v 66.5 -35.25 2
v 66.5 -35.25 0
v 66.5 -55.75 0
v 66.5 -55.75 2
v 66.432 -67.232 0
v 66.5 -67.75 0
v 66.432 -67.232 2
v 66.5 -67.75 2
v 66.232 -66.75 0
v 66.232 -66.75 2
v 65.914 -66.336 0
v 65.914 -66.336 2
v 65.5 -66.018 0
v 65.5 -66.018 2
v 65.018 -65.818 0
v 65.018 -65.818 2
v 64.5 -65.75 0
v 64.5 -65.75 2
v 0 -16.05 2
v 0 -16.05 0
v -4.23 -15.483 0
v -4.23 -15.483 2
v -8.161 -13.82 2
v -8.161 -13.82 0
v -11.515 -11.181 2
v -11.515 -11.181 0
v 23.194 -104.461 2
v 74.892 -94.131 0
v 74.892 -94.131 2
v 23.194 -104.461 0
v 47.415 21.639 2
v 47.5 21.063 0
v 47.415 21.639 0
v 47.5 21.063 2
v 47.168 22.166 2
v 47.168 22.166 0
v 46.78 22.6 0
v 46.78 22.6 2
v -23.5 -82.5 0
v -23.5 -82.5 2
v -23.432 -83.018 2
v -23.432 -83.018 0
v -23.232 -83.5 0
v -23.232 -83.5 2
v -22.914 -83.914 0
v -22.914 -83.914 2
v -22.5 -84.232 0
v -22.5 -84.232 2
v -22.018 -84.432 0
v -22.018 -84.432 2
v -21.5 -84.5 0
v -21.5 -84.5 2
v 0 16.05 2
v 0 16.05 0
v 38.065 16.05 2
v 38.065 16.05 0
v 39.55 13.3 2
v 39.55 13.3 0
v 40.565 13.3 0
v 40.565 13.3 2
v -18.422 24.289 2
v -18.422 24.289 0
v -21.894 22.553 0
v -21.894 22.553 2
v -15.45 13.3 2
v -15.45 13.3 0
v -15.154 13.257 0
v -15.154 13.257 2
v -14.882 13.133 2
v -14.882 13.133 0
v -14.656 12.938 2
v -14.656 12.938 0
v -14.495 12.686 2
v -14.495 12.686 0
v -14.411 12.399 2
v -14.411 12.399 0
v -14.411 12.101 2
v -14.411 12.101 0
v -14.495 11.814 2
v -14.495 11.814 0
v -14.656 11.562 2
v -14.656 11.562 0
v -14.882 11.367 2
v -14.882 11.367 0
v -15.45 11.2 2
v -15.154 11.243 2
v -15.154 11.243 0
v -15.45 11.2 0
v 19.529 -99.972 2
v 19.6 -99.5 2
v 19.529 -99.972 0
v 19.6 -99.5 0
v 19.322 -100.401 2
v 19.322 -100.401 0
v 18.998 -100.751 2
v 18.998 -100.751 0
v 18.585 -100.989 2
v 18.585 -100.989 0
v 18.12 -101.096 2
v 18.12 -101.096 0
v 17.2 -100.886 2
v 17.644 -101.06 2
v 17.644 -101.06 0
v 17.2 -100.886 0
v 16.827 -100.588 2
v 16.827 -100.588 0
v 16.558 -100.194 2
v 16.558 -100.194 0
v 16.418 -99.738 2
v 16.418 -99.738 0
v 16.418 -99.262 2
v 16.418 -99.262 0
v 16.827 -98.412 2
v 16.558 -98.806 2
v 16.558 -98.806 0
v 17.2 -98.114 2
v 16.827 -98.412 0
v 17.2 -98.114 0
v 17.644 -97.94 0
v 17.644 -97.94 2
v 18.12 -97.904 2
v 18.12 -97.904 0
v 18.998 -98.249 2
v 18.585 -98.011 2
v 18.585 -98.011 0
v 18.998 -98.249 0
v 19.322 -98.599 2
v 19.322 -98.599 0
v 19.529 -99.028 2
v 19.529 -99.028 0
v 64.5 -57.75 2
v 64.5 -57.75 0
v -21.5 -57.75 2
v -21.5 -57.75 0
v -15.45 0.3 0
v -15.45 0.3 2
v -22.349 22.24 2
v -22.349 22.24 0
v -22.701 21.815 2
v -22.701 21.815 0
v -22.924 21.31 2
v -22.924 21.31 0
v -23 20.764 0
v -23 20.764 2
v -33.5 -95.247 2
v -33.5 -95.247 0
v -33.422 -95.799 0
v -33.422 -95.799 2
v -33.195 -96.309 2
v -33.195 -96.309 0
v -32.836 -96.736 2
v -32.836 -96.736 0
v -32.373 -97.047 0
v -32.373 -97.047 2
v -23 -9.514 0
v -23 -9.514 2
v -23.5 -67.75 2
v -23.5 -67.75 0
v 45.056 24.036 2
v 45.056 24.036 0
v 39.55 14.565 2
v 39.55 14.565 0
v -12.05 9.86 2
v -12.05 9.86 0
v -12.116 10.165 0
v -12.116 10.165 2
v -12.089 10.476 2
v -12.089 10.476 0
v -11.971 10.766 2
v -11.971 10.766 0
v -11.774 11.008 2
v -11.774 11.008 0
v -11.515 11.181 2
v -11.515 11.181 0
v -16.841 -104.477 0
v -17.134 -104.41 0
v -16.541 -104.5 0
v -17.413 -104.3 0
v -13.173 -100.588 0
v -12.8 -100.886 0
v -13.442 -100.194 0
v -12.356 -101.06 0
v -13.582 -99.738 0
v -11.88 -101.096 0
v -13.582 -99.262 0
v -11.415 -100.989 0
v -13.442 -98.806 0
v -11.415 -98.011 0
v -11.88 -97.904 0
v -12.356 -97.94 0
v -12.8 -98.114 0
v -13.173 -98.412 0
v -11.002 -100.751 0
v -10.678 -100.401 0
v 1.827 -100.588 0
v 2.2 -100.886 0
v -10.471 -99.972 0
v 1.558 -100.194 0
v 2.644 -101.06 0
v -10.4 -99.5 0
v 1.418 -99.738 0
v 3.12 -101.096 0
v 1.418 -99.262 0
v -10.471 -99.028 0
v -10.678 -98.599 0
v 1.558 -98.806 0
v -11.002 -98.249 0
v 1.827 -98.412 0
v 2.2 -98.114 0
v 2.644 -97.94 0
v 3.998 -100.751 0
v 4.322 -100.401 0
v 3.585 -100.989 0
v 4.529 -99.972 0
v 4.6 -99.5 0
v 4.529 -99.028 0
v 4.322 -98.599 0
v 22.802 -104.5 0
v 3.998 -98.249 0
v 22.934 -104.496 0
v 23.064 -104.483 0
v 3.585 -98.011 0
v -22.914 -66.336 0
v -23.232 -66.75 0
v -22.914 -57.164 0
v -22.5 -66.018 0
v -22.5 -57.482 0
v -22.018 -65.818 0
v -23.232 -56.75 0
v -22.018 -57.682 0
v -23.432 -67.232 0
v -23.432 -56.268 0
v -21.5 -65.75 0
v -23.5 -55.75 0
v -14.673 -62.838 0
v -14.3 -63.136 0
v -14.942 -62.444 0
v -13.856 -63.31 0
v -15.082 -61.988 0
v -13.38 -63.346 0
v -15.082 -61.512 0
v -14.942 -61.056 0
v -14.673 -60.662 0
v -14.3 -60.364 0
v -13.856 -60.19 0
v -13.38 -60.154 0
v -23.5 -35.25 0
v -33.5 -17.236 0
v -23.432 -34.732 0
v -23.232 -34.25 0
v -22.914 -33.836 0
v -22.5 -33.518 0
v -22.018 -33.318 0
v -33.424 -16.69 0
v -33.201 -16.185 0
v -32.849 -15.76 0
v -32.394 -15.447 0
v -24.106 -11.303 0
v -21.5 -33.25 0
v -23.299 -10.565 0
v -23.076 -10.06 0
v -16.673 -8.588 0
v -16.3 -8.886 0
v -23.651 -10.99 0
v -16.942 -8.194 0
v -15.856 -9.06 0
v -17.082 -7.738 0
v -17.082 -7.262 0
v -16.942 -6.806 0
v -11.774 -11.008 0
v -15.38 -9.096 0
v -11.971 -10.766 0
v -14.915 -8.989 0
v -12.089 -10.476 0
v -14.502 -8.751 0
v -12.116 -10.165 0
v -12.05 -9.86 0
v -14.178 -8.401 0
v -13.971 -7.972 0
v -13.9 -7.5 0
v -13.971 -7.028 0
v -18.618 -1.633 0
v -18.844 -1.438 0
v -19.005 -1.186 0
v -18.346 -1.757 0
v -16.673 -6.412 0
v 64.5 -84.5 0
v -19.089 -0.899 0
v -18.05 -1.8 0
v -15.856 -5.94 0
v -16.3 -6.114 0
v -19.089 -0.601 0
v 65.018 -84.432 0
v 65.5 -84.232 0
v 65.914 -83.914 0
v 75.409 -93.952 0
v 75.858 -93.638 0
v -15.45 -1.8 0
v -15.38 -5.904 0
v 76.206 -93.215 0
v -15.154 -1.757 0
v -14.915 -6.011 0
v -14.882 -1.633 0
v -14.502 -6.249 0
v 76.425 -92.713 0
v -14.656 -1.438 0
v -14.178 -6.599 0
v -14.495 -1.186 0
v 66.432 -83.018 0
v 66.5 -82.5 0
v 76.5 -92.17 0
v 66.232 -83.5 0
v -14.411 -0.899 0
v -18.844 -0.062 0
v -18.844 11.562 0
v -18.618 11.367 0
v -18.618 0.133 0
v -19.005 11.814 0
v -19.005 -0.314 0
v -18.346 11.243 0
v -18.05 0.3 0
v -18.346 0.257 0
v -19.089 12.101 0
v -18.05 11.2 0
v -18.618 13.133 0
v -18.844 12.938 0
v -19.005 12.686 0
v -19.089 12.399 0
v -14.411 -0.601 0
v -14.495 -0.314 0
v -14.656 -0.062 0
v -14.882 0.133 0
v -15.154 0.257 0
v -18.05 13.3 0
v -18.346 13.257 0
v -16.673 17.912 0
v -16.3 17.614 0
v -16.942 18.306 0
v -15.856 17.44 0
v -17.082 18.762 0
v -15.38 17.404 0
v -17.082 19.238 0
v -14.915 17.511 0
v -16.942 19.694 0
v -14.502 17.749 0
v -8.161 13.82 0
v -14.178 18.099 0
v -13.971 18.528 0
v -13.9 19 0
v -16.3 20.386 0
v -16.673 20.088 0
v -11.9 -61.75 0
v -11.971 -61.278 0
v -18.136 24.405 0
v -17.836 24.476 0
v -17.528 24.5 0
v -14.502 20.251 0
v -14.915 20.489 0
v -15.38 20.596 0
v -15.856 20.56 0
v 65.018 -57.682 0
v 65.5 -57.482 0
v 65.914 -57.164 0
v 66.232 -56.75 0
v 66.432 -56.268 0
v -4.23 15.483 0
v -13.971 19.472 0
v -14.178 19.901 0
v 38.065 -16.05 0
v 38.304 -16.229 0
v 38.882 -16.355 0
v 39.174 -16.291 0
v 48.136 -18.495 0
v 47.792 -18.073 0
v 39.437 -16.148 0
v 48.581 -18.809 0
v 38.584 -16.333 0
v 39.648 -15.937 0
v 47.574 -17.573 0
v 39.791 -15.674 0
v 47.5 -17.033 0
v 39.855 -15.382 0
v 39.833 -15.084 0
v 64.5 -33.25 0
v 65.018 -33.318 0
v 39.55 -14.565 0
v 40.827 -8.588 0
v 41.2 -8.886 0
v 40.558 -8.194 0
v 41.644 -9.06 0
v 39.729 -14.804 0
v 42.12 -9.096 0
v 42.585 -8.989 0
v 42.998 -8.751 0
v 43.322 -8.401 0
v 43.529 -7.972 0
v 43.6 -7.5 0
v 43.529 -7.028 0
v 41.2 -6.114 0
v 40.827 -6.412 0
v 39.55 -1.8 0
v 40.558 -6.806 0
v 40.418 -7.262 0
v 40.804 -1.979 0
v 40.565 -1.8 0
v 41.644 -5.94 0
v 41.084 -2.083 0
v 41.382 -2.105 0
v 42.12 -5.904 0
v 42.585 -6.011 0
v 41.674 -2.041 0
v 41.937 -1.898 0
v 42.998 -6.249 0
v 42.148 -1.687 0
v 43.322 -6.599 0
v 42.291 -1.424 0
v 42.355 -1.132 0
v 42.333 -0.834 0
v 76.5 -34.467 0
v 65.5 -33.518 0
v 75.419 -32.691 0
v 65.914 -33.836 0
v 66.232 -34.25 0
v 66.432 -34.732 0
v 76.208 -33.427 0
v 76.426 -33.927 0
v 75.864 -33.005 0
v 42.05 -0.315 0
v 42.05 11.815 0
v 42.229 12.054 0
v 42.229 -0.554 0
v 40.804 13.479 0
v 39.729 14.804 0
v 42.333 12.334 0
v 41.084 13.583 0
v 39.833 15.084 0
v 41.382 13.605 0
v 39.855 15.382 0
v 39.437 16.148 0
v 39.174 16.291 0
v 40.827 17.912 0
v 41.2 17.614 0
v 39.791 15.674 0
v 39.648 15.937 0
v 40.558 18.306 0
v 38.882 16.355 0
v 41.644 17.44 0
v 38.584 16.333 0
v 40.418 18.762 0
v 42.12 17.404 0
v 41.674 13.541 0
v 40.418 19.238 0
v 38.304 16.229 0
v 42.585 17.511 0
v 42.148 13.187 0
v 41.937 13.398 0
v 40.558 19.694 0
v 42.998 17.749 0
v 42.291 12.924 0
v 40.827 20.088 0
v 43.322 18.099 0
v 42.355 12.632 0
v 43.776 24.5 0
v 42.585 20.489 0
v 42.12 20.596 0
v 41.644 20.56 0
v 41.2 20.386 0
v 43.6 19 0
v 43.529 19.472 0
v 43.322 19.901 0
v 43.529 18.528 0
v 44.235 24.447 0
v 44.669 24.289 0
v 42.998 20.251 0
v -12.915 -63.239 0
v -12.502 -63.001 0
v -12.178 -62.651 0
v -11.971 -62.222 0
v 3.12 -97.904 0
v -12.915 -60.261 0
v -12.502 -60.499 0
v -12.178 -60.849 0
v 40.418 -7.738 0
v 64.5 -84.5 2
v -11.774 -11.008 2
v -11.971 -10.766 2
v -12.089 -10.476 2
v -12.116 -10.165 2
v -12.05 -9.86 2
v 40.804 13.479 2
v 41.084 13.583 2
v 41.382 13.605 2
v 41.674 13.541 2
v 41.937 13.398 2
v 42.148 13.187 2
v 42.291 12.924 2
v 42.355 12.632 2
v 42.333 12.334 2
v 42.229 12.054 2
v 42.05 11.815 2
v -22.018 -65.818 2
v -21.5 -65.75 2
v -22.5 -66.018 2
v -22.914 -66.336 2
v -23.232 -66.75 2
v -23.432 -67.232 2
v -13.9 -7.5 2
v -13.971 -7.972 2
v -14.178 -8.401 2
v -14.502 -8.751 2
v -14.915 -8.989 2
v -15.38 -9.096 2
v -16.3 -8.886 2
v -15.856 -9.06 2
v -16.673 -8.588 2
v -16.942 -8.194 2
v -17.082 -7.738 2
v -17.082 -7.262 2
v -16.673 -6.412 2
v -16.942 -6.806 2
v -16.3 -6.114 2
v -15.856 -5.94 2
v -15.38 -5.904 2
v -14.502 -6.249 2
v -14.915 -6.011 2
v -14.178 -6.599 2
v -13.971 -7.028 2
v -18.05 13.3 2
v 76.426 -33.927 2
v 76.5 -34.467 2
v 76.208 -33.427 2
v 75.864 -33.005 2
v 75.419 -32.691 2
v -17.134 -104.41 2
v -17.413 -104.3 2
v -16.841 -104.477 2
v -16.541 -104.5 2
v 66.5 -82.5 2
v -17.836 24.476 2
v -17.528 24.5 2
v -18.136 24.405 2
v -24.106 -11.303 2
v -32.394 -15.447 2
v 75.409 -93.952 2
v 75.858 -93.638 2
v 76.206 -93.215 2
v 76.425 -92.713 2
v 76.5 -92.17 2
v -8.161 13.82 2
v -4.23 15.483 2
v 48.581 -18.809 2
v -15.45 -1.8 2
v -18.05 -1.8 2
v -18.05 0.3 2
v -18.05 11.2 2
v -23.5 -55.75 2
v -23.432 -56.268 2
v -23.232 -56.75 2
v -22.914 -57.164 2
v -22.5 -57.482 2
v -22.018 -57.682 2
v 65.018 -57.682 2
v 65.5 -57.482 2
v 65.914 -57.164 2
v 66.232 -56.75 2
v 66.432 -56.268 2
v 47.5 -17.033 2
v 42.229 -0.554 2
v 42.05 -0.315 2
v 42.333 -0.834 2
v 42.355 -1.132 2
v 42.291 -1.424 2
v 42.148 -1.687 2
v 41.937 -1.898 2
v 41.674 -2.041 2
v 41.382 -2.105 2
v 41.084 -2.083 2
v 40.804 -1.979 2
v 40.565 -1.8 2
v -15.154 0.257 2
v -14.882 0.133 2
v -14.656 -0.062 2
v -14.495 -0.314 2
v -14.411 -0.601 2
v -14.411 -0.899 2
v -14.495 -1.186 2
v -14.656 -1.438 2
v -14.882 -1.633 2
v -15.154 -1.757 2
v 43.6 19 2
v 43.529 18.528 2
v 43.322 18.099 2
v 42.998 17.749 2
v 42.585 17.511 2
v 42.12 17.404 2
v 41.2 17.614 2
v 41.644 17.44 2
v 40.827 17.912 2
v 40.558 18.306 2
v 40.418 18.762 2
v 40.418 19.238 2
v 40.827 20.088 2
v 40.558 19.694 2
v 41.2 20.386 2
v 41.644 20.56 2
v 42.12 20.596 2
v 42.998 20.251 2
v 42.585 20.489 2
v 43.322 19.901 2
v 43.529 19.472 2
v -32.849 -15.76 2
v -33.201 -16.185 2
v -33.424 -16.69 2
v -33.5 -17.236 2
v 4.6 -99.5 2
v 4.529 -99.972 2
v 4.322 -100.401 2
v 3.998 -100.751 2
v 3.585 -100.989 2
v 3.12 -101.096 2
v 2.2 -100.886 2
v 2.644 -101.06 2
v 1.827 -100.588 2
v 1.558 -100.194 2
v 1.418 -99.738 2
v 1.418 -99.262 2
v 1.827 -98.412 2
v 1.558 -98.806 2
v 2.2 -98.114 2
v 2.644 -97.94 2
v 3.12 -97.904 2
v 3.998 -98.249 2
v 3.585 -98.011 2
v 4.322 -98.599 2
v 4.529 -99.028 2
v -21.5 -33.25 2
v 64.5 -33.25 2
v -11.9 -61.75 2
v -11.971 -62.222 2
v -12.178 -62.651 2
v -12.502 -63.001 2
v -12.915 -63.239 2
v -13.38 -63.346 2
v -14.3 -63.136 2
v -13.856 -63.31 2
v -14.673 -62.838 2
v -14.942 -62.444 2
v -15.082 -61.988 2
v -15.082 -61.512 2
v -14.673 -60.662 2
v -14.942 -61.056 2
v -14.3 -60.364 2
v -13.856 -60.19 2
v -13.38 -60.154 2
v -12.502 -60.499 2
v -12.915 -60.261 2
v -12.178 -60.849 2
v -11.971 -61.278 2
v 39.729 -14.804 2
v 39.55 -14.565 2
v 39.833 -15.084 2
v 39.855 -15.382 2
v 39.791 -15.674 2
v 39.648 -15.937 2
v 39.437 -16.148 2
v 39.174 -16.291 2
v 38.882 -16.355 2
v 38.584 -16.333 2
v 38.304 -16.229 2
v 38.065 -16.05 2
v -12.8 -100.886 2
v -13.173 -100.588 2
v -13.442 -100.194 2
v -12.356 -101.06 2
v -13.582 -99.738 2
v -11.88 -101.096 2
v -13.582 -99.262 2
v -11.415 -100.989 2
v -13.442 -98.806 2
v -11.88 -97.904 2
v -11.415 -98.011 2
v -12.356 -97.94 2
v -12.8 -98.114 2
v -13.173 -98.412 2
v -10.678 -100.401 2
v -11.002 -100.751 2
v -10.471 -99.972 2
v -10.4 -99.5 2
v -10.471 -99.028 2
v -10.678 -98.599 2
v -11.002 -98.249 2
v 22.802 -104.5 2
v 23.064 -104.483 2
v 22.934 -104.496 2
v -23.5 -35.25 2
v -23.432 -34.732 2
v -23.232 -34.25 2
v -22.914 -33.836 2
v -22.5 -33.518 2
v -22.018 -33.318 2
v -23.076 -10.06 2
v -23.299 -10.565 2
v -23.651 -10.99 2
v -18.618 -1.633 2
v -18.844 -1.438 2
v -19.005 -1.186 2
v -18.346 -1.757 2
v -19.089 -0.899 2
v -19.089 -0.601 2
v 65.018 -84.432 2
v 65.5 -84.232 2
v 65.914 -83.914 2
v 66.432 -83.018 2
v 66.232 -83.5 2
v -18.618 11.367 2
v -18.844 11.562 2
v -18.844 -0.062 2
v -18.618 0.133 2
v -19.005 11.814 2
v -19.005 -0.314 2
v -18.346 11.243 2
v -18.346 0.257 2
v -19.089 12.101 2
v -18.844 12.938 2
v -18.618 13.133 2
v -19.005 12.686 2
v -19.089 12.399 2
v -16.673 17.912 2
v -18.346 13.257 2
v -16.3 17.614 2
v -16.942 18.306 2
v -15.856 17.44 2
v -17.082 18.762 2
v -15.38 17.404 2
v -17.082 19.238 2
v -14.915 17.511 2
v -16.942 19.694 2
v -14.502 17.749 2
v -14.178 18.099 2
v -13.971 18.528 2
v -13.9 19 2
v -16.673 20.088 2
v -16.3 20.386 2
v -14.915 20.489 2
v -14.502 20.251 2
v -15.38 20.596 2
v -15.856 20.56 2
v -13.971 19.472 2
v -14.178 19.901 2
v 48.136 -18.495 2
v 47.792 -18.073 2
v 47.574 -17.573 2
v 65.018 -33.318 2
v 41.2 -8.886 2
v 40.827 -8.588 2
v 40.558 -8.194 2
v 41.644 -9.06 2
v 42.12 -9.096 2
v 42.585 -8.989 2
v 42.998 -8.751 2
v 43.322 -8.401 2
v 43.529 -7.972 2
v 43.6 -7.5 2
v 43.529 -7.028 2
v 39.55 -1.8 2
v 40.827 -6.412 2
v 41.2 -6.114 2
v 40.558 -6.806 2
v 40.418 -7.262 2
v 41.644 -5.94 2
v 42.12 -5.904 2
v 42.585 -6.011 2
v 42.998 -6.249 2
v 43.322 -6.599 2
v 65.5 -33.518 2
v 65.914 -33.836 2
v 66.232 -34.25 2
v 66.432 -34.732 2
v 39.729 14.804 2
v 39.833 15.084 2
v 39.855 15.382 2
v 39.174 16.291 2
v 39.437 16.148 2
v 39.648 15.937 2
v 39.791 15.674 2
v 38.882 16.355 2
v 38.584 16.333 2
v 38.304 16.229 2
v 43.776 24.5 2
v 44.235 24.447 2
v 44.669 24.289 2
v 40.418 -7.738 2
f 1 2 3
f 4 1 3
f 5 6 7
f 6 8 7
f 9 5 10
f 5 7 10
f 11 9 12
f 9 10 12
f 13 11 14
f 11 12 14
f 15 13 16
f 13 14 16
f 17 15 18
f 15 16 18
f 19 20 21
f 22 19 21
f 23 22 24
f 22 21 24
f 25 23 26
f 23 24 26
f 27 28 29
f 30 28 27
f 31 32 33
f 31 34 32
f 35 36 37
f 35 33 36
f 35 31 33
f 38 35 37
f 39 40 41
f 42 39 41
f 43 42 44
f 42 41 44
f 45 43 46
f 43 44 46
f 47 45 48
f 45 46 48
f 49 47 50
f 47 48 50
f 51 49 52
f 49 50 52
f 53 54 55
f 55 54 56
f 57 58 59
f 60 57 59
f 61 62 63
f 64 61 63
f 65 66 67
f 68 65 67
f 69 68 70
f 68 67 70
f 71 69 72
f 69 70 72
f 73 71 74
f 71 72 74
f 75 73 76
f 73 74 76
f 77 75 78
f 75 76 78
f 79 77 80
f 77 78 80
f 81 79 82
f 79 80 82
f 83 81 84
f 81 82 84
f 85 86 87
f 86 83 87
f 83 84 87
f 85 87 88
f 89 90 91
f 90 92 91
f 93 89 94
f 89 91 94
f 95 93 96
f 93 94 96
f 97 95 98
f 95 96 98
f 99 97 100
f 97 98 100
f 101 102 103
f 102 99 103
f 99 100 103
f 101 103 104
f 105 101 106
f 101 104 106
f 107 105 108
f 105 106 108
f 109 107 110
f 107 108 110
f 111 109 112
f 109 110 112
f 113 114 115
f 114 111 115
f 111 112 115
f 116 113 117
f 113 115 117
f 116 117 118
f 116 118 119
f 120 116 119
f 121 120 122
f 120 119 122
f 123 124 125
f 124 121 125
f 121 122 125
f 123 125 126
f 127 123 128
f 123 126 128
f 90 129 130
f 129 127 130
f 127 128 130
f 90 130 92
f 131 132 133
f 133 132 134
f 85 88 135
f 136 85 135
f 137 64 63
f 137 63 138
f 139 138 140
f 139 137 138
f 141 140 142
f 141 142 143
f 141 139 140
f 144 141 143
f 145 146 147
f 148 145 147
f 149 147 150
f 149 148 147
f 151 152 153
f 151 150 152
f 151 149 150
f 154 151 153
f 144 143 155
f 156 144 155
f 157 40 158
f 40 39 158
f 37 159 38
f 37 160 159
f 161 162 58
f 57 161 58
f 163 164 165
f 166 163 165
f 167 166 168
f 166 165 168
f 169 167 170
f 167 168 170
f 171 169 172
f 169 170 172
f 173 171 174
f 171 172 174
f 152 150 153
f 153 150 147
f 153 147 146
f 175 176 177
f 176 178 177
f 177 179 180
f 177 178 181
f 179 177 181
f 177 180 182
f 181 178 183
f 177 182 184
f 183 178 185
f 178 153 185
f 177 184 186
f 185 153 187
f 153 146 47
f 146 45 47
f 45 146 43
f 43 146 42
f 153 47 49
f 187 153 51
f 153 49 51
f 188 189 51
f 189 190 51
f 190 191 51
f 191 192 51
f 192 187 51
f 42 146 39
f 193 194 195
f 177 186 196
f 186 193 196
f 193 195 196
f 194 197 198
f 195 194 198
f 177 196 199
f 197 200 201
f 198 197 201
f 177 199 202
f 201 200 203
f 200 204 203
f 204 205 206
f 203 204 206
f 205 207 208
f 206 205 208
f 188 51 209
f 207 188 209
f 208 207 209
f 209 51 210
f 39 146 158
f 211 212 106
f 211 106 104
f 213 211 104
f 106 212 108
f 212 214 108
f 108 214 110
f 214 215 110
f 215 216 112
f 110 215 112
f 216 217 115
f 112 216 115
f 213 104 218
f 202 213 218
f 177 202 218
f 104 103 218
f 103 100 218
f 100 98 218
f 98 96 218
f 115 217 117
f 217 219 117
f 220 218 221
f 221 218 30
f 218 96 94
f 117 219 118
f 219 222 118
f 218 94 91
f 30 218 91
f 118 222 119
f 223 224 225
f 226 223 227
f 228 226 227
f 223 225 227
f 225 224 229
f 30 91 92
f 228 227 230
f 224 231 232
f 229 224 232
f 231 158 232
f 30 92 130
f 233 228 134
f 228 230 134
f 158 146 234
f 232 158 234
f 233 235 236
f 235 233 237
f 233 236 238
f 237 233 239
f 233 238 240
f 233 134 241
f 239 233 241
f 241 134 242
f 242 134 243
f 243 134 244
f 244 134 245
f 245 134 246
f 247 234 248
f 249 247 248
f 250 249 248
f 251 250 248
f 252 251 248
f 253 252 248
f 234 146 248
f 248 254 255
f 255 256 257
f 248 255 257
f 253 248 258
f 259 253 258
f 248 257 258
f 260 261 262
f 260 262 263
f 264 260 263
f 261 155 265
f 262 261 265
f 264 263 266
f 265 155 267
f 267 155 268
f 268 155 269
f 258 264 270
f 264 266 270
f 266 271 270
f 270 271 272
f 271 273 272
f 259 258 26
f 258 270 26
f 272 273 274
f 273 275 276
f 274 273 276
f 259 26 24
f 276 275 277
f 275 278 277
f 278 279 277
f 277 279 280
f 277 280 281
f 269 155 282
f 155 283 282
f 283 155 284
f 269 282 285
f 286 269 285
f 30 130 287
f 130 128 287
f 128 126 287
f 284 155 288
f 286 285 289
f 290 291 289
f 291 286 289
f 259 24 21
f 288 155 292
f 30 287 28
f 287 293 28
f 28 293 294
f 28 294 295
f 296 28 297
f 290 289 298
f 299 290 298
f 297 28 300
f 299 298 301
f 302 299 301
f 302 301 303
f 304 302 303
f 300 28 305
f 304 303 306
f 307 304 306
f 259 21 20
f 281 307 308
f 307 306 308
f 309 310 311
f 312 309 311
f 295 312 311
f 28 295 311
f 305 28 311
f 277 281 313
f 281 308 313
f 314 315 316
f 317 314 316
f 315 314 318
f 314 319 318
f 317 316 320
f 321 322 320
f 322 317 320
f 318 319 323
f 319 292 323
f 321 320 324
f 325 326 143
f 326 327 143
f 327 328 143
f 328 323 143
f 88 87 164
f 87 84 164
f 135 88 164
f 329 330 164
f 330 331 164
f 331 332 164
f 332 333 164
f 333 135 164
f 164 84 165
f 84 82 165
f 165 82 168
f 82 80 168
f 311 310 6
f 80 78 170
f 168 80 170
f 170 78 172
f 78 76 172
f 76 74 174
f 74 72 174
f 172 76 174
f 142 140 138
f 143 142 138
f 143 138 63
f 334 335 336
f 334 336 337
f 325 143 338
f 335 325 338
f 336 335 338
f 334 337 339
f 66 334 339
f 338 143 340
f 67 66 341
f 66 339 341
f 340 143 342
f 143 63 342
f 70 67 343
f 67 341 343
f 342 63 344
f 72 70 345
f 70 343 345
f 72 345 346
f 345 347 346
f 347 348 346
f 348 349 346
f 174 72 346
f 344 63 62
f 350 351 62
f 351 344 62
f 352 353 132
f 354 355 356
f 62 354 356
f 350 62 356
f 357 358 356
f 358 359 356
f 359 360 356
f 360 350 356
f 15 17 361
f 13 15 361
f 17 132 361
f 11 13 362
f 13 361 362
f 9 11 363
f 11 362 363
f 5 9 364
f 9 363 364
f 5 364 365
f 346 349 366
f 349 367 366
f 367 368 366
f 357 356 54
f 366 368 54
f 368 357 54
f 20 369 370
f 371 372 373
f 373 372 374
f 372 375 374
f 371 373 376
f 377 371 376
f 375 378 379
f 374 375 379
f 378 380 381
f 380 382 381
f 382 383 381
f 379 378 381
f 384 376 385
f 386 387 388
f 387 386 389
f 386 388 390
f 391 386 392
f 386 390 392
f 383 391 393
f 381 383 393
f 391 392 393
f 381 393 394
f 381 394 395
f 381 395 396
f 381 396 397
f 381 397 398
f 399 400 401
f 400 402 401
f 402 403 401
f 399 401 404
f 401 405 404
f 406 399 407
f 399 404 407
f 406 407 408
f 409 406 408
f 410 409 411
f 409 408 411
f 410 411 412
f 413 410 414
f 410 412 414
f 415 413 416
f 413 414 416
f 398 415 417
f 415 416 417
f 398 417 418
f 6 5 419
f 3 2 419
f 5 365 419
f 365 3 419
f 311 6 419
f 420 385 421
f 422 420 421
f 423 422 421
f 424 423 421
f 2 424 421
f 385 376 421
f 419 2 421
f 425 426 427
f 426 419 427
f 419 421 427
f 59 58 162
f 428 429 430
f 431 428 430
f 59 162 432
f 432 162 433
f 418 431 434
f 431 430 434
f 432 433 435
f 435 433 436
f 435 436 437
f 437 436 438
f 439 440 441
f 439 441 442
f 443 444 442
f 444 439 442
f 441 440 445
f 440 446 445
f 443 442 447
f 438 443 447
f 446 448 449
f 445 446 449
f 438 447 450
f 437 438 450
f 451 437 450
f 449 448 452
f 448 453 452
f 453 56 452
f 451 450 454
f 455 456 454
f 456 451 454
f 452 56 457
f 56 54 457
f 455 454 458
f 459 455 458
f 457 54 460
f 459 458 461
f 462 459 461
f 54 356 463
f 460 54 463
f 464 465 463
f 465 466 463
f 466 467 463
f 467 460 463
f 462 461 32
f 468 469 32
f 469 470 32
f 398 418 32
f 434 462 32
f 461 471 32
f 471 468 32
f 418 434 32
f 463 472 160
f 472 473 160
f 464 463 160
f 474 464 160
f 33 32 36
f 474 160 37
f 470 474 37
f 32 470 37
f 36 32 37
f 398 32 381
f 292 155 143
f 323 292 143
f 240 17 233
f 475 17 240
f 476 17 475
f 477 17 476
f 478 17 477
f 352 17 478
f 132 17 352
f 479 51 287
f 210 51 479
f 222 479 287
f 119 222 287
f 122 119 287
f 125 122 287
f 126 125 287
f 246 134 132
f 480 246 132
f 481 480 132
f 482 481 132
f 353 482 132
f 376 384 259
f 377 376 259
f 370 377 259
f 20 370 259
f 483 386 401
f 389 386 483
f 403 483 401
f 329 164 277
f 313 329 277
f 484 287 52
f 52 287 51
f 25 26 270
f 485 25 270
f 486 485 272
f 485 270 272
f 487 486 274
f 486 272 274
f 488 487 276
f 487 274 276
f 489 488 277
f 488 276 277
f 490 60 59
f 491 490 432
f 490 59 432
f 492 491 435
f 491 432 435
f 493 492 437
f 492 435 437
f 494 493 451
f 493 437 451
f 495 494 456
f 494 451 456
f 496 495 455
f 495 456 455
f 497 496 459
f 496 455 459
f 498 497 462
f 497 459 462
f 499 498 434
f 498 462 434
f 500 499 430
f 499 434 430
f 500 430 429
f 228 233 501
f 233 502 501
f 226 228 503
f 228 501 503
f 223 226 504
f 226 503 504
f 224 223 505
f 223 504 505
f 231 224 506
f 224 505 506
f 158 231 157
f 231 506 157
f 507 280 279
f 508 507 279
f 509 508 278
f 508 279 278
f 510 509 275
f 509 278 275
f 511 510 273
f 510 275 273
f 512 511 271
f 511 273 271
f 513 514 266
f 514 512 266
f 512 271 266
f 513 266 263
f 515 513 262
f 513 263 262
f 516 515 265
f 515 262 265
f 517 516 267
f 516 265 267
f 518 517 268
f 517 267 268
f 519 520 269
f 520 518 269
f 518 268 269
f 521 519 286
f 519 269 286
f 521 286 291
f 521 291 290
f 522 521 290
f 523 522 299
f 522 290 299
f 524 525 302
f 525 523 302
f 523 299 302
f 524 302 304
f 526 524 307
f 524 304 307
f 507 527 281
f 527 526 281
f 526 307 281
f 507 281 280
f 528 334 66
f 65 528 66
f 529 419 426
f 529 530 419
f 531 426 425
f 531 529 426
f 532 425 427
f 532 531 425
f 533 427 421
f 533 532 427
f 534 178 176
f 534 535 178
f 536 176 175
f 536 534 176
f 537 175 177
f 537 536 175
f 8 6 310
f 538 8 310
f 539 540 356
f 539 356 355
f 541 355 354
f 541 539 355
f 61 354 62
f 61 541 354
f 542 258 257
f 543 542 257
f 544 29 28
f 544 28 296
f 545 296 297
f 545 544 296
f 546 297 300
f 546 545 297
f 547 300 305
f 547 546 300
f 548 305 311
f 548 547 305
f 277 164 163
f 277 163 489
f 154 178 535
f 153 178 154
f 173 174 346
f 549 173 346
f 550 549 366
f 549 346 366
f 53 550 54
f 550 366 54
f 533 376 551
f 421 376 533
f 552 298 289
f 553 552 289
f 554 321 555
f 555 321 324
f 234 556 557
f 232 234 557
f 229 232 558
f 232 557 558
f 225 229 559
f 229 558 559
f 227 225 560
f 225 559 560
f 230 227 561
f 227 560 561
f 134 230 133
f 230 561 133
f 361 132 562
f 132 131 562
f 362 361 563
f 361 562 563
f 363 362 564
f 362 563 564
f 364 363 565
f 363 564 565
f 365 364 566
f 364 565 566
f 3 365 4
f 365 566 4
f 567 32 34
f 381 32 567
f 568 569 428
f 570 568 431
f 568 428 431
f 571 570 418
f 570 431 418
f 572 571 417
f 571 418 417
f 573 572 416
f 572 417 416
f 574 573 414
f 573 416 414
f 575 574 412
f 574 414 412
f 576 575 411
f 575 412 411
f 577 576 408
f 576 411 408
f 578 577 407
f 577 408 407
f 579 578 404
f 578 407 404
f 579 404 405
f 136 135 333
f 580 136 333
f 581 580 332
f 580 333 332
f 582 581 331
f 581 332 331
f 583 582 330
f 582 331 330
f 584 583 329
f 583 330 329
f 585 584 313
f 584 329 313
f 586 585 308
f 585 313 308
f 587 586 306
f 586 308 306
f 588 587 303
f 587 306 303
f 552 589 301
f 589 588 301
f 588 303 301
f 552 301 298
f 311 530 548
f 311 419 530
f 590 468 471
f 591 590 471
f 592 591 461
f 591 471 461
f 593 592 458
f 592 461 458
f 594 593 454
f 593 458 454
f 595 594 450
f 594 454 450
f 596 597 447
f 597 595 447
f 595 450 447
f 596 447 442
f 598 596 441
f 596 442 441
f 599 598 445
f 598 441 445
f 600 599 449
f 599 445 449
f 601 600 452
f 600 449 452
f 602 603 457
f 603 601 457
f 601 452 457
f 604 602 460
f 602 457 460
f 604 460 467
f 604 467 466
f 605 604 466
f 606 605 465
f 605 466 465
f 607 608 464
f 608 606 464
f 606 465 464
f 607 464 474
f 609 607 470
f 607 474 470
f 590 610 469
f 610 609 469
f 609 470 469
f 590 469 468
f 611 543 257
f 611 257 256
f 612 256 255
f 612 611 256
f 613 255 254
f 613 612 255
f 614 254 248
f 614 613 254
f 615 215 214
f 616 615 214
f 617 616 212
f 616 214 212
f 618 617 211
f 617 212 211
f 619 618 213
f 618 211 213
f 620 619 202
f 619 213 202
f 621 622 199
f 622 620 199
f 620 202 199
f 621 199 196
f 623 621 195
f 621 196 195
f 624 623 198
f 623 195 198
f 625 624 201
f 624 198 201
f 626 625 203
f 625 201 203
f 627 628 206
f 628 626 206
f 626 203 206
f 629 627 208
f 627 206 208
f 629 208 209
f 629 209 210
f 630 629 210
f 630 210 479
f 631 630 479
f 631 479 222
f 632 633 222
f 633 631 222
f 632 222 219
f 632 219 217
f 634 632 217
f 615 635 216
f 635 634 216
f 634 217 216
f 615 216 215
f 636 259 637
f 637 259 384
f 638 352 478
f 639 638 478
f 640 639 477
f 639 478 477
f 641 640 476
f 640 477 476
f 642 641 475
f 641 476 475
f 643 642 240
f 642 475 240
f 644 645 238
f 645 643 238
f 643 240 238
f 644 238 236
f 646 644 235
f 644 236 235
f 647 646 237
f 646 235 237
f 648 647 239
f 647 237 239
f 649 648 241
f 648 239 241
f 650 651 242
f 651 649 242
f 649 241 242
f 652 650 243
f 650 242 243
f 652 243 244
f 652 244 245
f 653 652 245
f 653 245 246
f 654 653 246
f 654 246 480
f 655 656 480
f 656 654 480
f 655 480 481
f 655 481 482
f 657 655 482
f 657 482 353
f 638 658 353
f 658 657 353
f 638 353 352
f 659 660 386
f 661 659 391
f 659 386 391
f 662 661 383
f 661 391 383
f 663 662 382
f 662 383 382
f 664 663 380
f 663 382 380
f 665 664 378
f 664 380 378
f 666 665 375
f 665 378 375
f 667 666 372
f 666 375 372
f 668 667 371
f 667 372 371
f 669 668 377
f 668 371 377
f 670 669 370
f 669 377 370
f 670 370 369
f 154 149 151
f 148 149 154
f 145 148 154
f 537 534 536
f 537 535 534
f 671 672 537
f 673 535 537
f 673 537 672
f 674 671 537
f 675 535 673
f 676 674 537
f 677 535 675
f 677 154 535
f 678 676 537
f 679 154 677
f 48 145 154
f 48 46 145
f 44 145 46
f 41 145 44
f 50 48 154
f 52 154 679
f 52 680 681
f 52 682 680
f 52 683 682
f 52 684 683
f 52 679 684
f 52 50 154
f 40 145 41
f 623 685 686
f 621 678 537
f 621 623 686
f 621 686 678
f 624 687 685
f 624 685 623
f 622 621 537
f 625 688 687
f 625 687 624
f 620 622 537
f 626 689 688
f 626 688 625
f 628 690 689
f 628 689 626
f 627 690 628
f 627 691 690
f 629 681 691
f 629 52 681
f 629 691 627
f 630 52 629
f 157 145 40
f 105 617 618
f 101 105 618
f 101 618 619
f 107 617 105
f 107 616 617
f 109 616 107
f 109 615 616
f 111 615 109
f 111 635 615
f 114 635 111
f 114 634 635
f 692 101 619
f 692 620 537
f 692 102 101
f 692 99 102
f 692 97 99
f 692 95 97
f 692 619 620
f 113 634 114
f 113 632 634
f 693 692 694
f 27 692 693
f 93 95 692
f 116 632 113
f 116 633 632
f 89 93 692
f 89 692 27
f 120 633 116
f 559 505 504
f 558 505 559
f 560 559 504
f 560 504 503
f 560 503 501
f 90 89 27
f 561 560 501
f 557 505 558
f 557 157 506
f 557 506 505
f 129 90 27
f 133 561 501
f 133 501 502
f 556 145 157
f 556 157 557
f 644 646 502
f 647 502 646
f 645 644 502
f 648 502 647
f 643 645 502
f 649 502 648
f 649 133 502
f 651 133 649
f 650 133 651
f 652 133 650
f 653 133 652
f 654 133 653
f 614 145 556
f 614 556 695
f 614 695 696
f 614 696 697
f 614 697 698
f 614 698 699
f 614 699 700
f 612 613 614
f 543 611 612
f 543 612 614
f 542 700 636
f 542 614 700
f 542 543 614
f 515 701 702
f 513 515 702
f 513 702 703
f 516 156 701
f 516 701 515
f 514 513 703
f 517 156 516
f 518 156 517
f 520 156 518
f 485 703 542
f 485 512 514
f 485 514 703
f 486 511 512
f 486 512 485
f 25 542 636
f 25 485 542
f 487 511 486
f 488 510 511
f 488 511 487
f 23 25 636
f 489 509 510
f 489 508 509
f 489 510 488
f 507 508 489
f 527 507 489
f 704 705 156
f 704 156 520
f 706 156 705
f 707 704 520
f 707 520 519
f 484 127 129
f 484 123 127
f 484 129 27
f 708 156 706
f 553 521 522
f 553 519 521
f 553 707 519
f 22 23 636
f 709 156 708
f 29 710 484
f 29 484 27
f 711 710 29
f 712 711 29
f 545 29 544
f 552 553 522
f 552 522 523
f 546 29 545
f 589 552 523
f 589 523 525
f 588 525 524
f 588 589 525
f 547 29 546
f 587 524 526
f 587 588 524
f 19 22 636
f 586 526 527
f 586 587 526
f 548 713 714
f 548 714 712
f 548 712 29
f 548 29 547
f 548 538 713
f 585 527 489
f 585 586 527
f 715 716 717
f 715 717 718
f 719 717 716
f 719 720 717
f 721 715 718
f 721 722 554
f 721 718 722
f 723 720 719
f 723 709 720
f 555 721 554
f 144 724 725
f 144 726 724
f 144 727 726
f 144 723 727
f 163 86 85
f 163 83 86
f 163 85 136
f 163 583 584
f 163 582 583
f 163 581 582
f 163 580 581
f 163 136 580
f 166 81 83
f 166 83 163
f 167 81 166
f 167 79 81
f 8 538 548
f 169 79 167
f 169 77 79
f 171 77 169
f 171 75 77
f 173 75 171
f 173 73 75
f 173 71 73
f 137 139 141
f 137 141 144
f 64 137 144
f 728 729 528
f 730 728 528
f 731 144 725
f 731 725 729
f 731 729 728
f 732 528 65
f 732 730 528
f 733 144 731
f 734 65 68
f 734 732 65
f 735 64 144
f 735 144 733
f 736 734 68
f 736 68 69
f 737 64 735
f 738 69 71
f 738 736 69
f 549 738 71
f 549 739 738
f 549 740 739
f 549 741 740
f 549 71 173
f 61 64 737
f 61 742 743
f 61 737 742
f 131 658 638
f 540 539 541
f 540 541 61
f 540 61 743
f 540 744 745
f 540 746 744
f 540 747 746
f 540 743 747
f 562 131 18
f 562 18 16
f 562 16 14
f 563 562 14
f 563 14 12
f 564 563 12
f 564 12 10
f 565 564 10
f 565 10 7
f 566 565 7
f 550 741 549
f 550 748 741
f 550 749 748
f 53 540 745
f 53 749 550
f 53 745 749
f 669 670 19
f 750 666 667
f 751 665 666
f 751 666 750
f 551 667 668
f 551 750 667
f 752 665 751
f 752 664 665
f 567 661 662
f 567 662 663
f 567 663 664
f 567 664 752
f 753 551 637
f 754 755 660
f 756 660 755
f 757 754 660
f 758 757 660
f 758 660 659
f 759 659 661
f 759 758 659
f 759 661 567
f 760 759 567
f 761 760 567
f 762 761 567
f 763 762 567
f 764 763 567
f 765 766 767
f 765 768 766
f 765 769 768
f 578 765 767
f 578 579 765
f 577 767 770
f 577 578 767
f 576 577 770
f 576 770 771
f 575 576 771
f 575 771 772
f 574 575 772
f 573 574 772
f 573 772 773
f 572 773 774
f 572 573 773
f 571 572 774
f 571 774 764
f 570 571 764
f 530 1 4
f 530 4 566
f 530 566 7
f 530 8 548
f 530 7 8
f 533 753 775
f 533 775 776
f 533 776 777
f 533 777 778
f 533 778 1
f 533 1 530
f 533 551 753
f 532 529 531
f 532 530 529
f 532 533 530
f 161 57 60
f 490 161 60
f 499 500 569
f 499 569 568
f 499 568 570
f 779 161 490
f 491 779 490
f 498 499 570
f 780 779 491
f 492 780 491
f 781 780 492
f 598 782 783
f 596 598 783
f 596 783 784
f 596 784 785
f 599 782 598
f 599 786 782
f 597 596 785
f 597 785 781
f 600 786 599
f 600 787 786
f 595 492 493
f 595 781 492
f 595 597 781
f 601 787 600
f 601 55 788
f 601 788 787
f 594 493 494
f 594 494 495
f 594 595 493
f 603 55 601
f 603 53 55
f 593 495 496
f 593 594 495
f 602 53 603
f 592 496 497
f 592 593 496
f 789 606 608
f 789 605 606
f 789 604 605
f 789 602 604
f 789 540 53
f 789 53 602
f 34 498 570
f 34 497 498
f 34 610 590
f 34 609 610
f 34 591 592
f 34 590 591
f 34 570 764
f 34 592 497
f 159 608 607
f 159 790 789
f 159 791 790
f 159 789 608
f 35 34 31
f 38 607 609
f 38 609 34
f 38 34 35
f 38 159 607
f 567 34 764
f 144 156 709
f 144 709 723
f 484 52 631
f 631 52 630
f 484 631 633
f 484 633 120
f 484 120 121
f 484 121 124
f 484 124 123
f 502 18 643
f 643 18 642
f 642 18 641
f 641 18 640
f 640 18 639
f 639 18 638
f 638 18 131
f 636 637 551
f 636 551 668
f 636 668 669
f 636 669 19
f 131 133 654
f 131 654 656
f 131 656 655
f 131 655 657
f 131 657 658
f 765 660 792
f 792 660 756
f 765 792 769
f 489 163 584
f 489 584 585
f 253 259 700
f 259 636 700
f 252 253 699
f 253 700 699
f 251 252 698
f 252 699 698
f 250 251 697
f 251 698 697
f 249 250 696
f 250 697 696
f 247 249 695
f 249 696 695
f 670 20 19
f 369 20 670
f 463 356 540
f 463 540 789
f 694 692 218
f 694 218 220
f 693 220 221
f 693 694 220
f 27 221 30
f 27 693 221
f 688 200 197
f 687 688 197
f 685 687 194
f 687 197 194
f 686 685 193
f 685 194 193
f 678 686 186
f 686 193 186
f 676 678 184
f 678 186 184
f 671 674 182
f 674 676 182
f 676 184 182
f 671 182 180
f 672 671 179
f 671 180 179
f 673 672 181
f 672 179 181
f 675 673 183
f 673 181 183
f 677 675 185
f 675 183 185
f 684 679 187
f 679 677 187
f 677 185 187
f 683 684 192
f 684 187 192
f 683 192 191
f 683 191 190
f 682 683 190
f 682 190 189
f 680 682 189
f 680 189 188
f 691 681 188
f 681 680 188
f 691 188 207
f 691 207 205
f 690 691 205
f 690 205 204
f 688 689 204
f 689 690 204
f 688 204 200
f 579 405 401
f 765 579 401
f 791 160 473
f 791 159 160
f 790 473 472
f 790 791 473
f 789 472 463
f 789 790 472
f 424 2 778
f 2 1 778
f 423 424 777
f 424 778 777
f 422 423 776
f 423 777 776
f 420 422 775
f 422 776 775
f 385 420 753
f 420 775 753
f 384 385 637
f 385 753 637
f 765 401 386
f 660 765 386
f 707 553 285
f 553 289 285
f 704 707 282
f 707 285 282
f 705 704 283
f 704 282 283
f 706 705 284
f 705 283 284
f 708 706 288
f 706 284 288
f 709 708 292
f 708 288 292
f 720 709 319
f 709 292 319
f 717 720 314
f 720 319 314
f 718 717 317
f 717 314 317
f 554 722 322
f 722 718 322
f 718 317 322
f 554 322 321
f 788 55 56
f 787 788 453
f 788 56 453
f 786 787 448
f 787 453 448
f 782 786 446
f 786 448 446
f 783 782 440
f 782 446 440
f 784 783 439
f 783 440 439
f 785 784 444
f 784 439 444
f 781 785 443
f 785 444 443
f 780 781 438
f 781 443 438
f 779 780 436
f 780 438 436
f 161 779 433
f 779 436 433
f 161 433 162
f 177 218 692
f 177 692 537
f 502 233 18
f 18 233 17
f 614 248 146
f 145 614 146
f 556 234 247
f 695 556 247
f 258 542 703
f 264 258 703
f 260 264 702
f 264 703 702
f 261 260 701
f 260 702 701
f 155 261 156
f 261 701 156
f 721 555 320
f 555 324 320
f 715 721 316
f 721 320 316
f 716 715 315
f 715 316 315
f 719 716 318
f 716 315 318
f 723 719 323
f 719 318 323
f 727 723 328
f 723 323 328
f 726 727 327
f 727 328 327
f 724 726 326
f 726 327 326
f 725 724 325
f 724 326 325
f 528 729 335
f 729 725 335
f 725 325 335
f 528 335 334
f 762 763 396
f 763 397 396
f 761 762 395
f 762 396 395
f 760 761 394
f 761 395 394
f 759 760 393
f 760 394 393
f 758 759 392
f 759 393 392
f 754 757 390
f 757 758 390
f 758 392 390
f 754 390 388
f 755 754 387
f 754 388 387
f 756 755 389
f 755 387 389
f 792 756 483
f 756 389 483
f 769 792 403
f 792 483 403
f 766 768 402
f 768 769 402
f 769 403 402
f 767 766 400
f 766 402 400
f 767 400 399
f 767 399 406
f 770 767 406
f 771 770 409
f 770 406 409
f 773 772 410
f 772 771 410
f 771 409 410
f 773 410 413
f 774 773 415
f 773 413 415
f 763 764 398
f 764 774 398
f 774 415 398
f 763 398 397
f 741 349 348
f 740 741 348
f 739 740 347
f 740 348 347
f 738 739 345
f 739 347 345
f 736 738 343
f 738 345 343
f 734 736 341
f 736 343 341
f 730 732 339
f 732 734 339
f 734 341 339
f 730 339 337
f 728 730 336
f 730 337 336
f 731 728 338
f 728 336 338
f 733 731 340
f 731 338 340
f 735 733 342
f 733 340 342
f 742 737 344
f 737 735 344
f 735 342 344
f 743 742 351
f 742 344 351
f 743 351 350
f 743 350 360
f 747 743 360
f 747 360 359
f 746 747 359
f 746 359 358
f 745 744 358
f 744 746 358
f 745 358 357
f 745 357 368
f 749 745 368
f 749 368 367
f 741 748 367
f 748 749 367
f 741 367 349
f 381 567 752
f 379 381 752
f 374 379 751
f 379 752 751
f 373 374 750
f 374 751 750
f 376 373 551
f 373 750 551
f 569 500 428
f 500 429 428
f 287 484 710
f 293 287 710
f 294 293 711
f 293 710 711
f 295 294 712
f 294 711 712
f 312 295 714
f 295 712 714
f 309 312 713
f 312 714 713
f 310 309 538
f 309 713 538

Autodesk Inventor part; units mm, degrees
ref_plane "YZ Plane" through (0, 0, 0) normal (1, 0, 0) x (0, 1, 0)
ref_plane "XZ Plane" through (0, 0, 0) normal (0, 1, 0) x (-1, 0, 0)
ref_plane "XY Plane" through (0, 0, 0) normal (0, 0, 1) x (1, 0, 0)
sketch "スケッチ1" plane through (0, 0, 0) normal (0, 0, 1) x (1, 0, 0)
  circle A0 centre (0, 0) radius 11
  line L0 (-0.3073, 13.5) -> (26.6927, 13.5) construction
  line L1 (26.6927, 13.5) -> (26.6927, -13.5) construction
  line L2 (26.6927, -13.5) -> (-0.3073, -13.5) construction
  line L3 (-0.3073, -13.5) -> (-0.3073, 13.5) construction
  line L4 (-0.3073, 13.5) -> (26.6927, -13.5) construction
  line L5 (26.6927, 13.5) -> (-0.3073, -13.5) construction
  line L6 (-12, 16) -> (39.5, 16) construction
  line L7 (39.5, 16) -> (39.5, -16) construction
  line L8 (39.5, -16) -> (-12, -16) construction
  line L9 (-12, -16) -> (-12, 16) construction
  line L10 (-12, 16) -> (39.5, -16) construction
  line L11 (39.5, 16) -> (-12, -16) construction
  circle A1 centre (-0.3073, 13.5) radius 1.35
  arc A2 (0, 16) -> (-12, 10.583) centre (0, 0) ccw construction
  line L12 (-12, 0) -> (39.5, 0)
  circle A3 centre (26.6927, 13.5) radius 1.35
  arc A4 (-12, -10.583) -> (0, -16) centre (0, 0) ccw construction
  circle A5 centre (-0.3073, -13.5) radius 1.35
  circle A6 centre (26.6927, -13.5) radius 1.35
  arc A7 (0, 16.05) -> (-12.05, 10.6019) centre (0, 0) ccw
  line L13 (0, 16.05) -> (39.55, 16.05)
  line L14 (39.55, 16.05) -> (39.55, 13.3)
  line L15 (-12.05, 10.6019) -> (-12.05, 0)
  arc A8 (-11.5146, 11.1811) -> (-12.05, 9.86) centre (-11.0677, 10.2309) ccw
  line L16 (-12.05, 10.6019) -> (-11.0677, 10.2309) construction
  arc A9 (39.55, 14.5651) -> (38.0651, 16.05) centre (38.8075, 15.3075) ccw
  line L17 (38.8075, 15.3075) -> (39.55, 16.05) construction
  arc A10 (-12.05, -10.6019) -> (0, -16.05) centre (0, 0) ccw
  line L18 (0, -16.05) -> (39.55, -16.05)
  line L19 (-12.05, -10.6019) -> (-12.05, 0)
  arc A11 (-12.05, -9.86) -> (-11.5146, -11.1811) centre (-11.0677, -10.2309) ccw
  arc A12 (38.0651, -16.05) -> (39.55, -14.5651) centre (38.8075, -15.3075) ccw
  line L20 (39.55, 13.3) -> (42.05, 13.3)
  line L21 (42.05, 13.3) -> (42.05, -1.8)
  line L22 (42.05, -1.8) -> (39.55, -1.8)
  line L23 (39.55, -1.8) -> (39.55, -14.5651)
  line L24 (39.5, 13.25) -> (42, 13.25) construction
  line L25 (42, 13.25) -> (42, -1.75) construction
  line L26 (42, -1.75) -> (39.5, -1.75) construction
  line L27 (42, 5.75) -> (39.5, 5.75) construction
  arc A13 (42.05, 11.8151) -> (40.5651, 13.3) centre (41.3075, 12.5575) ccw
  line L28 (41.3075, 12.5575) -> (42.05, 13.3) construction
  arc A14 (40.5651, -1.8) -> (42.05, -0.3151) centre (41.3075, -1.0575) ccw
  circle A15 centre (-15.5, 19) radius 1.6
  line L29 (-18, 22) -> (-13, 22) construction
  line L30 (-13, 22) -> (-13, -10.5) construction
  line L31 (-13, -10.5) -> (-18, -10.5) construction
  line L32 (-18, -10.5) -> (-18, 22) construction
  line L33 (-18, 22) -> (-13, -10.5) construction
  line L34 (-13, 22) -> (-18, -10.5) construction
  line L35 (-18, 5.75) -> (-13, 5.75) construction
  line L36 (-15.5, 22) -> (-15.5, -10.5) construction
  line L37 (-18, 13.25) -> (-15.5, 13.25) construction
  line L38 (-15.5, 13.25) -> (-15.5, -1.75) construction
  line L39 (-15.5, -1.75) -> (-18, -1.75) construction
  line L40 (-18, 13.25) -> (-15.5, -1.75) construction
  line L41 (-15.5, 13.25) -> (-18, -1.75) construction
  line L42 (-15.45, -1.8) -> (-18.05, -1.8)
  line L43 (-18.05, -1.8) -> (-18.05, 13.3)
  line L44 (-18.05, 13.3) -> (-15.45, 13.3)
  line L45 (-15.45, 13.3) -> (-15.45, -1.8)
  line L46 (-15.45, -1.8) -> (-18.05, 13.3) construction
  line L47 (-18.05, -1.8) -> (-15.45, 13.3) construction
  line L48 (-16.75, 13.3) -> (-16.75, -1.8) construction
  arc A16 (-18.05, 13.3) -> (-18.05, 11.2) centre (-18.05, 12.25) ccw
  arc A17 (-15.45, 11.2) -> (-15.45, 13.3) centre (-15.45, 12.25) ccw
  arc A18 (-18.05, 0.3) -> (-18.05, -1.8) centre (-18.05, -0.75) ccw
  arc A19 (-15.45, -1.8) -> (-15.45, 0.3) centre (-15.45, -0.75) ccw
  circle A20 centre (-15.5, -7.5) radius 1.6
  line L49 (13.1927, 16) -> (13.1927, -16) construction
  circle A21 centre (42, 19) radius 1.6
  line L50 (39.5, 22) -> (44.5, 22) construction
  line L51 (44.5, 22) -> (44.5, -10.5) construction
  line L52 (44.5, -10.5) -> (39.5, -10.5) construction
  line L53 (39.5, 22) -> (44.5, -10.5) construction
  line L54 (44.5, 22) -> (39.5, -10.5) construction
  line L55 (42, 22) -> (42, -10.5) construction
  circle A22 centre (42, -7.5) radius 1.6
  line L56 (-12, 23.25) -> (-12, 18.25) construction
  line L57 (-18, 24.5) -> (44.5, 24.5)
  line L58 (-18, 24.5) -> (-23, 22)
  line L59 (44.5, 24.5) -> (47.5, 22)
  line L60 (-23, 22) -> (-23, -10.75)
  line L61 (47.5, 22) -> (47.5, -18.25)
  line L62 (47.5, -18.25) -> (76.5, -33.25)
  line L63 (-23, -10.75) -> (-33.5, -16)
  line L64 (-33.5, -16) -> (-33.5, -96.5)
  line L65 (76.5, -33.25) -> (76.5, -93.8101)
  line L66 (76.5, -93.8101) -> (23, -104.5)
  line L67 (23, -104.5) -> (-17, -104.5)
  line L68 (-17, -104.5) -> (-33.5, -96.5)
  circle A23 centre (-12, -99.5) radius 1.6
  circle A24 centre (3, -99.5) radius 1.6
  line L69 (-17, -104.5) -> (-17, -94.5) construction
  line L70 (-17, -94.5) -> (23, -94.5) construction
  line L71 (23, -94.5) -> (23, -104.5) construction
  line L72 (-17, -99.5) -> (23, -99.5) construction
  line L73 (3, -94.5) -> (3, -104.5) construction
  circle A25 centre (18, -99.5) radius 1.6
  circle A26 centre (-13.5, -61.75) radius 1.6
  line L74 (-23.5, -65.75) -> (66.5, -65.75)
  line L75 (66.5, -65.75) -> (66.5, -84.5)
  line L76 (66.5, -84.5) -> (-23.5, -84.5)
  line L77 (-23.5, -84.5) -> (-23.5, -65.75)
  line L78 (-23.5, -33.25) -> (66.5, -33.25)
  line L79 (66.5, -33.25) -> (66.5, -57.75)
  line L80 (66.5, -57.75) -> (-23.5, -57.75)
  line L81 (-23.5, -57.75) -> (-23.5, -33.25)
  circle A27 centre (-13.5, -61.75) radius 4 construction
  line L82 (-9.8584, -97.6093) -> (-9.2918, -98.5907)
  line L83 (-9.2918, -100.4093) -> (-9.8584, -101.3907)
  line L84 (-11.4334, -102.3) -> (-12.5666, -102.3)
  line L85 (-14.1416, -101.3907) -> (-14.7082, -100.4093)
  line L86 (-14.7082, -98.5907) -> (-14.1416, -97.6093)
  line L87 (-12.5666, -96.7) -> (-11.4334, -96.7)
  arc A28 (-9.8584, -97.6093) -> (-11.4334, -96.7) centre (-10.9084, -97.6093) ccw
  arc A29 (-12.5666, -96.7) -> (-14.1416, -97.6093) centre (-13.0916, -97.6093) ccw
  arc A30 (-14.7082, -98.5907) -> (-14.7082, -100.4093) centre (-14.1832, -99.5) ccw
  arc A31 (-14.1416, -101.3907) -> (-12.5666, -102.3) centre (-13.0916, -101.3907) ccw
  arc A32 (-11.4334, -102.3) -> (-9.8584, -101.3907) centre (-10.9084, -101.3907) ccw
  arc A33 (-9.2918, -100.4093) -> (-9.2918, -98.5907) centre (-9.8168, -99.5) ccw
  arc A34 (5.7082, -100.4093) -> (5.7082, -98.5907) centre (5.1832, -99.5) ccw
  line L88 (5.1416, -97.6093) -> (5.7082, -98.5907)
  line L89 (5.7082, -100.4093) -> (5.1416, -101.3907)
  arc A35 (3.5666, -102.3) -> (5.1416, -101.3907) centre (4.0916, -101.3907) ccw
  arc A36 (5.1416, -97.6093) -> (3.5666, -96.7) centre (4.0916, -97.6093) ccw
  line L90 (2.4334, -96.7) -> (3.5666, -96.7)
  arc A37 (2.4334, -96.7) -> (0.8584, -97.6093) centre (1.9084, -97.6093) ccw
  line L91 (0.2918, -98.5907) -> (0.8584, -97.6093)
  arc A38 (0.2918, -98.5907) -> (0.2918, -100.4093) centre (0.8168, -99.5) ccw
  line L92 (0.8584, -101.3907) -> (0.2918, -100.4093)
  arc A39 (0.8584, -101.3907) -> (2.4334, -102.3) centre (1.9084, -101.3907) ccw
  line L93 (3.5666, -102.3) -> (2.4334, -102.3)
  arc A40 (20.7082, -100.4093) -> (20.7082, -98.5907) centre (20.1832, -99.5) ccw
  line L94 (20.1416, -97.6093) -> (20.7082, -98.5907)
  line L95 (20.7082, -100.4093) -> (20.1416, -101.3907)
  arc A41 (18.5666, -102.3) -> (20.1416, -101.3907) centre (19.0916, -101.3907) ccw
  arc A42 (20.1416, -97.6093) -> (18.5666, -96.7) centre (19.0916, -97.6093) ccw
  line L96 (17.4334, -96.7) -> (18.5666, -96.7)
  arc A43 (17.4334, -96.7) -> (15.8584, -97.6093) centre (16.9084, -97.6093) ccw
  line L97 (15.2918, -98.5907) -> (15.8584, -97.6093)
  arc A44 (15.2918, -98.5907) -> (15.2918, -100.4093) centre (15.8168, -99.5) ccw
  line L98 (15.8584, -101.3907) -> (15.2918, -100.4093)
  arc A45 (15.8584, -101.3907) -> (17.4334, -102.3) centre (16.9084, -101.3907) ccw
  line L99 (18.5666, -102.3) -> (17.4334, -102.3)
  point P0 (13.1927, 0)
  point P1 (-15.5, 5.75)
  point P2 (-16.75, 5.75)
  point P3 (13.1927, 0)
  point P4 (42, 5.75)
  point P5 (42, 5.75)
  point P6 (-18.05, 0.3)
  point P7 (-15.45, 0.3)
  point P8 (42.05, -0.3151)
  point P9 (40.5651, -1.8)
  point P10 (-10.3834, -96.7)
  point P11 (-13.6166, -96.7)
  point P12 (-15.2332, -99.5)
  point P13 (-13.6166, -102.3)
  point P14 (-10.3834, -102.3)
  point P15 (-8.7668, -99.5)
  point P16 (-13.6166, -96.7)
  point P17 (-15.2332, -99.5)
  point P18 (-8.7668, -99.5)
  point P19 (3, -99.5)
  point P20 (6.2332, -99.5)
  point P21 (6.2332, -99.5)
  point P22 (4.6166, -96.7)
  point P23 (4.6166, -102.3)
  point P24 (3, -99.5)
  point P25 (3, -99.5)
  point P26 (1.3834, -96.7)
  point P27 (1.3834, -96.7)
  point P28 (-0.2332, -99.5)
  point P29 (-0.2332, -99.5)
  point P30 (1.3834, -102.3)
  point P31 (18, -99.5)
  point P32 (21.2332, -99.5)
  point P33 (21.2332, -99.5)
  point P34 (19.6166, -96.7)
  point P35 (19.6166, -102.3)
  point P36 (18, -99.5)
  point P37 (18, -99.5)
  point P38 (16.3834, -96.7)
  point P39 (16.3834, -96.7)
  point P40 (14.7668, -99.5)
  point P41 (14.7668, -99.5)
  point P42 (16.3834, -102.3)
  dimension "d0" = 22
  dimension "d1" = 27
  dimension "d2" = 27
  dimension "d5" = 32
  dimension "d8" = 2.7
  dimension "d9" = 16
  dimension "d10" = 2.7
  dimension "d13" = 12
  dimension "d16" = 0.05
  dimension "d17" = 1.05
  dimension "d18" = 0.05
  dimension "d19" = 1.05
  dimension "d21" = 15
  dimension "d23" = 0.05
  dimension "d24" = 0.05
  dimension "d25" = 0.05
  dimension "d26" = 1.05
  dimension "d27" = 3.2
  dimension "d28" = 5
  dimension "d29" = 2.5
  dimension "d30" = 15
  dimension "d32" = 2.6
  dimension "d33" = 15.1
  dimension "d34" = 1.05
  dimension "d35" = 26.5
  dimension "d36" = 5.5
  dimension "d37" = 2.5
  dimension "d38" = 3.2
  dimension "d39" = 5
  dimension "d40" = 32.5
  dimension "d41" = 26.5
  dimension "d55" = 5
  dimension "d56" = 3
  dimension "d57" = 20.5
  dimension "d60" = 40
  dimension "d61" = 8
  dimension "d63" = 3.2
  dimension "d64" = 3.2
  dimension "d66" = 10
  dimension "d70" = 30
  dimension "d71" = 3.2
  dimension "d72" = 32.75
  dimension "d73" = 20
  dimension "d74" = 8
  dimension "d75" = 10
  dimension "d77" = 10
  dimension "d78" = 10
  dimension "d87" = 1.05
  dimension "d88" = 360
  dimension "d89" = 5.6
  dimension "d92" = 15
  dimension "d97" = 120.5
  dimension "d98" = 1
  dimension "d100" = 110
  dimension "d101" = 2.5
extrude "押し出し1" add sketch "スケッチ1" along normal blind 2 contours L57 L59 L61 L62 L65 L66 L67 L68 L64 L63 L60 L58 | L82 A33 L83 A32 L84 A31 L85 A30 L86 A29 L87 A28 | L89 A35 L93 A39 L92 A38 L91 A37 L90 A36 L88 A34 | L95 A41 L99 A45 L98 A44 L97 A43 L96 A42 L94 A40
fillet "フィレット1" radius 2 12 edges at (-17, -104.5, 1) (-33.5, -96.5, 1) (-33.5, -16, 1) (-23, -10.75, 1) (23, -104.5, 1) (76.5, -93.8101, 1) (76.5, -33.25, 1) (47.5, -18.25, 1) (47.5, 22, 1) (44.5, 24.5, 1) (-23, 22, 1) (-18, 24.5, 1)
fillet "フィレット2" radius 2 8 edges at (-23.5, -33.25, 1) (-23.5, -57.75, 1) (66.5, -57.75, 1) (66.5, -33.25, 1) (-23.5, -84.5, 1) (-23.5, -65.75, 1) (66.5, -84.5, 1) (66.5, -65.75, 1)
equation "\"d10\" = d8"
equation "\"d16\" = d15"
equation "\"d18\" = d15"
equation "\"d19\" = d17"
equation "\"d23\" = d15"
equation "\"d24\" = d23"
equation "\"d25\" = d15"
equation "\"d26\" = d17"
equation "\"d15\" = 0.05"
properties part number "Trunk_upper_flank_frame" material "GFRP"
